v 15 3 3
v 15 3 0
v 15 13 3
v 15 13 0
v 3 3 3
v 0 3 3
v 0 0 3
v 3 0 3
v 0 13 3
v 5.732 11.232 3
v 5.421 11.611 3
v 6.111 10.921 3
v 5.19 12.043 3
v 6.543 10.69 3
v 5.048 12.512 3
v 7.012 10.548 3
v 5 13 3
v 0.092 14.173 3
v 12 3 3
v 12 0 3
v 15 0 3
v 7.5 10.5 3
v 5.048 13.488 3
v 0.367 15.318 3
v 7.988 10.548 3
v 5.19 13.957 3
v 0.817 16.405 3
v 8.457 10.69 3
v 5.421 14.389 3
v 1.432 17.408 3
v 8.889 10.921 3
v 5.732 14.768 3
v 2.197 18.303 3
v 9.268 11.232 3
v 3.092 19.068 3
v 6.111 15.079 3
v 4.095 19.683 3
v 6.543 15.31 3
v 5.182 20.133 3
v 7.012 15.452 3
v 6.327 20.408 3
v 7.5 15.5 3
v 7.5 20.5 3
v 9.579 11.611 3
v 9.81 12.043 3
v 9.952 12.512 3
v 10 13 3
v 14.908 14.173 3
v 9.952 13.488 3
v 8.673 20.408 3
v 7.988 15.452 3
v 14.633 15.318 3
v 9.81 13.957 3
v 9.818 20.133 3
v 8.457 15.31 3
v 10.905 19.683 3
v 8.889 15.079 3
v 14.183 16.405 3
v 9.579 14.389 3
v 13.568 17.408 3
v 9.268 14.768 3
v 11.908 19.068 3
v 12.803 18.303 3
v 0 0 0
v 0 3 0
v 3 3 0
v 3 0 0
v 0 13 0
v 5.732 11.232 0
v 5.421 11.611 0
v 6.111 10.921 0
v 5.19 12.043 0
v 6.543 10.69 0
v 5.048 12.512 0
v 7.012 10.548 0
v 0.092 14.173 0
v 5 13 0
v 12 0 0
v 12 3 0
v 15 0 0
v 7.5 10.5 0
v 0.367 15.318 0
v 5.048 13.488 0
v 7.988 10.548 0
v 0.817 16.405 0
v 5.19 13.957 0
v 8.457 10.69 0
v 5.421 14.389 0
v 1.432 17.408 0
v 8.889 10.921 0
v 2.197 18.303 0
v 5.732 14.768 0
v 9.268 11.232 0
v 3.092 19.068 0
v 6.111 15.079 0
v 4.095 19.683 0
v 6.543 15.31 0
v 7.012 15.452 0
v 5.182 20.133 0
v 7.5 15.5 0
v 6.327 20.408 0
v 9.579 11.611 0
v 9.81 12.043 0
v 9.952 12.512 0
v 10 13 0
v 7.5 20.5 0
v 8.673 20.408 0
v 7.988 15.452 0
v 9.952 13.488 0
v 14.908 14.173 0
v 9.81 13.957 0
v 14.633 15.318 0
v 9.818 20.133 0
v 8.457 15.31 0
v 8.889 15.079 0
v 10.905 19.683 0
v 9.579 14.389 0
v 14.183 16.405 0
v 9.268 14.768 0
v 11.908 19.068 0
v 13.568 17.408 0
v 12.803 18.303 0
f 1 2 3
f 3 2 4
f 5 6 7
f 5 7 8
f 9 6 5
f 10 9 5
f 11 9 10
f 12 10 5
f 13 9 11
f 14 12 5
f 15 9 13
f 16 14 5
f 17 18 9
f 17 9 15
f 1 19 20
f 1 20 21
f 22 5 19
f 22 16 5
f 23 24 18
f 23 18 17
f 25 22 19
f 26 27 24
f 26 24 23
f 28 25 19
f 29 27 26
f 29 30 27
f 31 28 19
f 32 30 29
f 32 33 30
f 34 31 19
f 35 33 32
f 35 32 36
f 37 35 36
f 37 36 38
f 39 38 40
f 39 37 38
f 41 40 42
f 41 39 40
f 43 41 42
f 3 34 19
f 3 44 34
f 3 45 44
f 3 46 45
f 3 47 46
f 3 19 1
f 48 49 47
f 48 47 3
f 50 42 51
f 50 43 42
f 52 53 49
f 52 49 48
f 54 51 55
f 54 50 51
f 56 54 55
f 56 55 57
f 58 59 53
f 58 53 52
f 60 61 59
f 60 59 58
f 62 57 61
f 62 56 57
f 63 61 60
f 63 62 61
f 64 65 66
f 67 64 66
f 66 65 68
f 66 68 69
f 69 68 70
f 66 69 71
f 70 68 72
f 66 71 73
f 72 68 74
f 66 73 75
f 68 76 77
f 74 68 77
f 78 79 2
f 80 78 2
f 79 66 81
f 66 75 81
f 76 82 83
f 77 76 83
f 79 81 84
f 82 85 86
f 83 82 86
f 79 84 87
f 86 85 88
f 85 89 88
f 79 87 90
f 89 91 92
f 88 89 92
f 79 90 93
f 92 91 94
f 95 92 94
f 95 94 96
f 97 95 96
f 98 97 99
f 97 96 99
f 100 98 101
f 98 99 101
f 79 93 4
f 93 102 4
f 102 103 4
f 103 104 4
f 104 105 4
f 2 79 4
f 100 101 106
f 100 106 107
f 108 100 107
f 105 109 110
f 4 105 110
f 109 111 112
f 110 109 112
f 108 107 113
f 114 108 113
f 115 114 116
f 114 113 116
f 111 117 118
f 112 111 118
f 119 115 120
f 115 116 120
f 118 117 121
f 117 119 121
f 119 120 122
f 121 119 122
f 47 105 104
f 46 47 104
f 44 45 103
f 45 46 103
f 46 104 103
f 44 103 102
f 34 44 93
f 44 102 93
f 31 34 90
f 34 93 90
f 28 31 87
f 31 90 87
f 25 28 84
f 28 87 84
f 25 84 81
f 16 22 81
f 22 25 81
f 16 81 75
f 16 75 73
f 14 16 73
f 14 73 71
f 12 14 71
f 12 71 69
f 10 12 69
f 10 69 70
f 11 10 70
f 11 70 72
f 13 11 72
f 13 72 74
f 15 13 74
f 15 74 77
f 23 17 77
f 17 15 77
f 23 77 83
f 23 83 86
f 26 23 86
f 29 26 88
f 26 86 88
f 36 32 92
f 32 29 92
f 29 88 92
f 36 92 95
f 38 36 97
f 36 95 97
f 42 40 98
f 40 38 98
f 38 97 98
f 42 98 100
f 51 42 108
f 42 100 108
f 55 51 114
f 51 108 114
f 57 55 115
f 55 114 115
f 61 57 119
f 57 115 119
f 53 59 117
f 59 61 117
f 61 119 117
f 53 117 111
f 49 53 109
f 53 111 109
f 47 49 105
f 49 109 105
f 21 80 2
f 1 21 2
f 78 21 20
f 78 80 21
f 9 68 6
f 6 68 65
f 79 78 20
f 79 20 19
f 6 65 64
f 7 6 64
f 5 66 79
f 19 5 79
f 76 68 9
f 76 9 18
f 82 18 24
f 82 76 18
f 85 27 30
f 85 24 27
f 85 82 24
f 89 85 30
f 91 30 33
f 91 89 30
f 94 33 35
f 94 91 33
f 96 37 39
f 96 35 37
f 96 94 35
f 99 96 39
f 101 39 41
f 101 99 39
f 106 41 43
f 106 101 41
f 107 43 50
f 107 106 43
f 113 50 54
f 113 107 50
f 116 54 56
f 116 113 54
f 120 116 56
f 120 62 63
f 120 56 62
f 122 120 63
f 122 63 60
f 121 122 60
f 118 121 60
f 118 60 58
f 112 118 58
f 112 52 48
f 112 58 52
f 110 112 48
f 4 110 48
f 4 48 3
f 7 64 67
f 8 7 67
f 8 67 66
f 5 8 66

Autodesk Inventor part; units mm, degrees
ref_plane "YZ Plane" through (0, 0, 0) normal (1, 0, 0) x (0, 1, 0)
ref_plane "XZ Plane" through (0, 0, 0) normal (0, 1, 0) x (-1, 0, 0)
ref_plane "XY Plane" through (0, 0, 0) normal (0, 0, 1) x (1, 0, 0)
sketch "Sketch1" plane through (0, 0, 0) normal (0, 0, 1) x (1, 0, 0)
  line L0 (15, 0) -> (15, 13)
  line L1 (0, 13) -> (0, 0)
  arc A0 (15, 13) -> (0, 13) centre (7.5, 13) ccw
  circle A1 centre (7.5, 13) radius 2.5
  line L2 (0, 0) -> (3, 0)
  line L3 (3, 0) -> (3, 3)
  line L4 (0, 3) -> (0, 0)
  line L5 (15, 0) -> (12, 0)
  line L6 (12, 0) -> (12, 3)
  line L7 (15, 3) -> (15, 0)
  line L8 (3, 3) -> (12, 3)
  line L9 (0, 0) -> (3, 0)
  line L10 (12, 0) -> (15, 0)
  dimension "d0" = 15
  dimension "d1" = 13
  dimension "d2" = 5
extrude "Extrusion1" add sketch "Sketch1" along normal blind 3
properties part number "Connector_2"
